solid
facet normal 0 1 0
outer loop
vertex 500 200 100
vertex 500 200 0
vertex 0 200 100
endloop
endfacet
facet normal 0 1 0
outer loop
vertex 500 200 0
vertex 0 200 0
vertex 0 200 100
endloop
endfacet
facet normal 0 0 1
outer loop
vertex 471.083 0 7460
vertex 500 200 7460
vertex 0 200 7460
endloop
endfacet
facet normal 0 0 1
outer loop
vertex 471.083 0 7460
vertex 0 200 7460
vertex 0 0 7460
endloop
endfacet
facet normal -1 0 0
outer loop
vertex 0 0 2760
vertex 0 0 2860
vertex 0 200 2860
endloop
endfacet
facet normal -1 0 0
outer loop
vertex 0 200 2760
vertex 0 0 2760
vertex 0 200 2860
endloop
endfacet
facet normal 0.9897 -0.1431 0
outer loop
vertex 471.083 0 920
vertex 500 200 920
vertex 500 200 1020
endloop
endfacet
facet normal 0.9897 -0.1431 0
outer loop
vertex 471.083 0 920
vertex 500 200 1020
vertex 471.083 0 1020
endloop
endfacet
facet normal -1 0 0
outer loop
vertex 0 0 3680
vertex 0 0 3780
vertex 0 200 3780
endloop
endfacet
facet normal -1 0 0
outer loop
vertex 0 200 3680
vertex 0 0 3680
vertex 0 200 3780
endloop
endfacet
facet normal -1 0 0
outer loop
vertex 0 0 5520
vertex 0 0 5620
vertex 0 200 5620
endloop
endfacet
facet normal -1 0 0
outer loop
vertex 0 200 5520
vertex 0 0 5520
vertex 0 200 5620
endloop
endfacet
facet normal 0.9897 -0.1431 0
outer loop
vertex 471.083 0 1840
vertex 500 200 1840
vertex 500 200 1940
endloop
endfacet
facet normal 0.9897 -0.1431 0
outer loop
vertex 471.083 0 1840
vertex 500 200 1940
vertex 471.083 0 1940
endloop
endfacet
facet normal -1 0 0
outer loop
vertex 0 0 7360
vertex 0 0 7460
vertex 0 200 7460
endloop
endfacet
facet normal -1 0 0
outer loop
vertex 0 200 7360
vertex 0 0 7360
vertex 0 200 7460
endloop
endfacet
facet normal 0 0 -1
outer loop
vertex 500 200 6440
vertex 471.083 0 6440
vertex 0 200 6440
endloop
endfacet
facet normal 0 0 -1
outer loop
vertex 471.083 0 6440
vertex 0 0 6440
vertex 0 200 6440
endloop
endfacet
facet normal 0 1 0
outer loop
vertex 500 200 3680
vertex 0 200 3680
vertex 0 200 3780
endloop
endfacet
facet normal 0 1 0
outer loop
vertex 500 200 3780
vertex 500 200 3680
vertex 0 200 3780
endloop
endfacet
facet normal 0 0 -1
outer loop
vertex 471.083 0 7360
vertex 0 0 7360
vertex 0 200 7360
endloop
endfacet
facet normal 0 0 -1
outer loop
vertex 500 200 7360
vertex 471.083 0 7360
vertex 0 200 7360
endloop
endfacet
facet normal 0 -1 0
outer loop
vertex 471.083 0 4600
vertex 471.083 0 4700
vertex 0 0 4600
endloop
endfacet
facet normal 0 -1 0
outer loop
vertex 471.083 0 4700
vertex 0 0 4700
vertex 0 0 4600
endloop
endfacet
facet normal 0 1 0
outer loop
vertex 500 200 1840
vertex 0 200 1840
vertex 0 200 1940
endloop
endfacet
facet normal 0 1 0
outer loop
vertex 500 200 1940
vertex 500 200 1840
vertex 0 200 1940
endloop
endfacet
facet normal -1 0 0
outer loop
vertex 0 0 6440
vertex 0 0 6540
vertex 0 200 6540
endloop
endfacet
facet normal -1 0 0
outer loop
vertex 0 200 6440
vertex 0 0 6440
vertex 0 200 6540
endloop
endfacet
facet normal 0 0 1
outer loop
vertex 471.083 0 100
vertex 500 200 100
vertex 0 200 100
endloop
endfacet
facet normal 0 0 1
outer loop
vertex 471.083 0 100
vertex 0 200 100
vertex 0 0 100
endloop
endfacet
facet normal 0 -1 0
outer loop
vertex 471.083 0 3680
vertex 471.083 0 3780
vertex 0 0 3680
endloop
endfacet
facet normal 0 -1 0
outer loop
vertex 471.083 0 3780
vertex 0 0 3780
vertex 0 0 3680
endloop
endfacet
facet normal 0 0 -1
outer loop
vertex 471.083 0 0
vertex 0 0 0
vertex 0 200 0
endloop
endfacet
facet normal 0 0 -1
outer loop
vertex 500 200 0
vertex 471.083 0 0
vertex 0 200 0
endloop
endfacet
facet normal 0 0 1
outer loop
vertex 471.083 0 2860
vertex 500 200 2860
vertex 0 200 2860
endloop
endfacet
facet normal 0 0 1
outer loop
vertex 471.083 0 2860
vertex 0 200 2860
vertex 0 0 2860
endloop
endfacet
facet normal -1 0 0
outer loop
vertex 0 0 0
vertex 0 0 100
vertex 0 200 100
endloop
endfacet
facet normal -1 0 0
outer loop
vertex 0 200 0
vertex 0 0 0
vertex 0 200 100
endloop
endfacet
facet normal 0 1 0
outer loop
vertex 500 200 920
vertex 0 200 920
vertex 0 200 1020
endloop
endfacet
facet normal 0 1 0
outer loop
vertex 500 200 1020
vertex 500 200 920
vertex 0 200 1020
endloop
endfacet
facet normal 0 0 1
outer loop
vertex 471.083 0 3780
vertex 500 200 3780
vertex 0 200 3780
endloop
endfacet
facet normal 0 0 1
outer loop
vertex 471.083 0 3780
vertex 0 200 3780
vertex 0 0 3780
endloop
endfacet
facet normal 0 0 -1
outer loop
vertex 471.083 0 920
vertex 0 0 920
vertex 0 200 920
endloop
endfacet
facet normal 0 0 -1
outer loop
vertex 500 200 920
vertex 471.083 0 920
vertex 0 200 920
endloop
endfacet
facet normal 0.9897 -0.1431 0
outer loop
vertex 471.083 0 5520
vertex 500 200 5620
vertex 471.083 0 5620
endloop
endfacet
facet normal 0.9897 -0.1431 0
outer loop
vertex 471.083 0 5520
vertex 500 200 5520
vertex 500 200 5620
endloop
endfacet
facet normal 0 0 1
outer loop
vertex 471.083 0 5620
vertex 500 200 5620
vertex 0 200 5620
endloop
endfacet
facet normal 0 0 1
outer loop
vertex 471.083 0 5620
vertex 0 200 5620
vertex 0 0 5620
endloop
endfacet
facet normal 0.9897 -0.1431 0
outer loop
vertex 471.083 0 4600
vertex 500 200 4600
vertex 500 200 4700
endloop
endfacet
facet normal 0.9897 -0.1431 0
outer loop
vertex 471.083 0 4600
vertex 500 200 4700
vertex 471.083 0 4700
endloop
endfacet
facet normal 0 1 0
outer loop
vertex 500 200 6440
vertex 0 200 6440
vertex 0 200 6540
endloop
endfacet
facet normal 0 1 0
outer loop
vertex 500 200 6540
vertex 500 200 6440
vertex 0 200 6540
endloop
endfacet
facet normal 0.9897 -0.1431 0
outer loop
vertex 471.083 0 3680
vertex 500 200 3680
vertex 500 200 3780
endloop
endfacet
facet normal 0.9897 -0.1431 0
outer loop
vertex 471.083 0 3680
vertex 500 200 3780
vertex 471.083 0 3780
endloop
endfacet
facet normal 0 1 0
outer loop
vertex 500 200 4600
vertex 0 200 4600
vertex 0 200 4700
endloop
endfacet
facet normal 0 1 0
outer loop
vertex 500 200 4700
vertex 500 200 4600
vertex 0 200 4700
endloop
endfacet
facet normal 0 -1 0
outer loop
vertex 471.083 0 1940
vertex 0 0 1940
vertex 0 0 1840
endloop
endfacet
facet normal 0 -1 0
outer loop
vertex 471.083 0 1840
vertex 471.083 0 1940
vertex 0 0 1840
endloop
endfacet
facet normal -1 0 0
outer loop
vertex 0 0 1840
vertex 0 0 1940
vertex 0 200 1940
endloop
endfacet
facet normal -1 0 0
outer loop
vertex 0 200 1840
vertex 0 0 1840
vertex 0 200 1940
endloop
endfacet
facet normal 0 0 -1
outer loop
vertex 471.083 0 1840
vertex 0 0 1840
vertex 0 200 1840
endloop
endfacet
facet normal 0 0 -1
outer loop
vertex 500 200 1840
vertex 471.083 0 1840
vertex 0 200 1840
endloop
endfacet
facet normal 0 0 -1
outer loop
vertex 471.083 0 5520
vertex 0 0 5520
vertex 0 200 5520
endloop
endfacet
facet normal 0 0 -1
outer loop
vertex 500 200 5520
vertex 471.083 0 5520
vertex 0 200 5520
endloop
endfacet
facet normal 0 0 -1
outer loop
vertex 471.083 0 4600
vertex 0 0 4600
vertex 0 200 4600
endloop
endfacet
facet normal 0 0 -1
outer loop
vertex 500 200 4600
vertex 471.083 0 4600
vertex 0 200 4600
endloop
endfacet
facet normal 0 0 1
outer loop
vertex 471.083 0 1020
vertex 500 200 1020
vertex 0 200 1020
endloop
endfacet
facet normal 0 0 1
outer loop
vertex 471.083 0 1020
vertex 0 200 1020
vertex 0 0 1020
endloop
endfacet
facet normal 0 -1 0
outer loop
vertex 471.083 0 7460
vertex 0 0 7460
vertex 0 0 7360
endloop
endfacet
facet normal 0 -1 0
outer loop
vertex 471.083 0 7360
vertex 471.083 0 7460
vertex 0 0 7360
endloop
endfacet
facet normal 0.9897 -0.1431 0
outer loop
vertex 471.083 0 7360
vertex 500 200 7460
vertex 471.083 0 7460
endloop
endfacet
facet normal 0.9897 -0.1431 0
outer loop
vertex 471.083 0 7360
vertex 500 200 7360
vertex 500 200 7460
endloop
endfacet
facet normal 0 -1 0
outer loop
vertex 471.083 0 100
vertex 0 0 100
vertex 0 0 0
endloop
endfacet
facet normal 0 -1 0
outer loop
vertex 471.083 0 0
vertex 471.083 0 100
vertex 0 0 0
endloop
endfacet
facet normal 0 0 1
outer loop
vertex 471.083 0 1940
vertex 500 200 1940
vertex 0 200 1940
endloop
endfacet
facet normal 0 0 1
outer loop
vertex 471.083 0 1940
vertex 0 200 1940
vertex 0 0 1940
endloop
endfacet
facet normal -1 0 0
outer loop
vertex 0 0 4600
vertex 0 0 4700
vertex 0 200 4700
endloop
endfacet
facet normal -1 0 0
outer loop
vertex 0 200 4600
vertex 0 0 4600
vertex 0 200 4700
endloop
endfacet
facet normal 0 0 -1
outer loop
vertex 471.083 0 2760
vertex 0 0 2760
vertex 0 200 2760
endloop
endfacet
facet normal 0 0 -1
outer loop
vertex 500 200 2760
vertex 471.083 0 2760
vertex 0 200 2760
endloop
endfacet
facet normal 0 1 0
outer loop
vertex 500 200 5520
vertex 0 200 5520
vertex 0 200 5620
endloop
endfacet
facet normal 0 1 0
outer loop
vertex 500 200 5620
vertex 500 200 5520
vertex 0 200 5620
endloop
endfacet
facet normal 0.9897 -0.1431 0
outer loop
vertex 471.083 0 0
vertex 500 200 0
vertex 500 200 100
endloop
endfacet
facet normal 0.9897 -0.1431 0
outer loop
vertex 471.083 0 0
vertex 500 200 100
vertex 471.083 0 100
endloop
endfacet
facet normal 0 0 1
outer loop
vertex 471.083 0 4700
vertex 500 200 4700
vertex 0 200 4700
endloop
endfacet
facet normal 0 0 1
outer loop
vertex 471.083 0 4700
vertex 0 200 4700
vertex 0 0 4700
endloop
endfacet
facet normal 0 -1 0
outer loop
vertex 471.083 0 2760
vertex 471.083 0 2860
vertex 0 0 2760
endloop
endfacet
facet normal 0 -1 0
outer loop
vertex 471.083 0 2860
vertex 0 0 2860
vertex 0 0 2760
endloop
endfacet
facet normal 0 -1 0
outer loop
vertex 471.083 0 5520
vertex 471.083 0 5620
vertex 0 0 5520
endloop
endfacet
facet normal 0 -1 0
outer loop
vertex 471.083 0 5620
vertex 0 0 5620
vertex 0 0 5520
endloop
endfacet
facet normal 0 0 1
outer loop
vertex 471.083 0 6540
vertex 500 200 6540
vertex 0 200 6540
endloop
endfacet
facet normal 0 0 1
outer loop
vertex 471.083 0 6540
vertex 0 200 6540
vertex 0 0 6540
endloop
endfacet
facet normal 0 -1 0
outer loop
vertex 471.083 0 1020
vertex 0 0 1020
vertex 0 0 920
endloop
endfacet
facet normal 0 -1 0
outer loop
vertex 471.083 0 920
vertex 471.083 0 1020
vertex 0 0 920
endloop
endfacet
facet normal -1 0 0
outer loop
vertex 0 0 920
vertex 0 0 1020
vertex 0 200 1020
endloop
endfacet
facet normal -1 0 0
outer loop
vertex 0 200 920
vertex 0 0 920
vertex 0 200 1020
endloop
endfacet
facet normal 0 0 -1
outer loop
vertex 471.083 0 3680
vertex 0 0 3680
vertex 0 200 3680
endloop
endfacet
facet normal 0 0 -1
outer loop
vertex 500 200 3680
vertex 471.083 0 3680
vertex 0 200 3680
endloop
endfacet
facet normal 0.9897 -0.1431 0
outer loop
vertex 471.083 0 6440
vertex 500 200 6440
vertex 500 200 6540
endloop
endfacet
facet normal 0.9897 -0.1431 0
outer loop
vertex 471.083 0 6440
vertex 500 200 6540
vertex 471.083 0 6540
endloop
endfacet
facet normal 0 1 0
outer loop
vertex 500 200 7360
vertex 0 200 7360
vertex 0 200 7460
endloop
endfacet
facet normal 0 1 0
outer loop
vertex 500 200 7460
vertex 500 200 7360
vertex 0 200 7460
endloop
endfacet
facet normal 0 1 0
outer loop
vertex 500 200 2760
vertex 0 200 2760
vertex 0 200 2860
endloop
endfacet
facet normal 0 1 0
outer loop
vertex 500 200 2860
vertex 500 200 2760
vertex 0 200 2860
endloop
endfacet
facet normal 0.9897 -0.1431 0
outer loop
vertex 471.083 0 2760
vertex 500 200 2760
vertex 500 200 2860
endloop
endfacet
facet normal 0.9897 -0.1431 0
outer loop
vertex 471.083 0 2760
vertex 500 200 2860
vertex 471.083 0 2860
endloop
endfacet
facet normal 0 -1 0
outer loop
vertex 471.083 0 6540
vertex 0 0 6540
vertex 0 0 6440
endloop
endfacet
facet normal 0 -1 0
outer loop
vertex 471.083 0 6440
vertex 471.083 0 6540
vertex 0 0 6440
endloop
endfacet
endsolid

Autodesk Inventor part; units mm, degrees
ref_plane "YZ Plane" through (0, 0, 0) normal (1, 0, 0) x (0, 1, 0)
ref_plane "XZ Plane" through (0, 0, 0) normal (0, 1, 0) x (-1, 0, 0)
ref_plane "XY Plane" through (0, 0, 0) normal (0, 0, 1) x (1, 0, 0)
sketch "Sketch1" plane through (0, 0, 0) normal (1, 0, 0) x (0, 1, 0)
  line L0 (0, 0) -> (200, 0)
  line L1 (200, 0) -> (200, 100)
  line L2 (200, 100) -> (0, 100)
  line L3 (0, 100) -> (0, 0)
  dimension "d0" = 200
  dimension "d1" = 100
extrude "Extrusion1" add sketch "Sketch1" along normal blind 500
pattern_linear "Rectangular Pattern1" count 9 spacing 920 along (0, 0, 1) of "Extrusion1"
sketch "Sketch2" plane through (0, 0, 0) normal (0, 0, -1) x (-1, 0, 0)
  line L0 (-500, -0.0003) -> (-500, 200)
  line L1 (-500, 0) -> (-500, 200) projected
  line L2 (-500, 0) -> (-471.0829, 0)
  line L3 (0, 0) -> (-500, 0) projected
  line L4 (-500, 200) -> (-471.0829, 0)
extrude "Extrusion2" cut sketch "Sketch2" against normal through all
properties part number "Szarufak"
